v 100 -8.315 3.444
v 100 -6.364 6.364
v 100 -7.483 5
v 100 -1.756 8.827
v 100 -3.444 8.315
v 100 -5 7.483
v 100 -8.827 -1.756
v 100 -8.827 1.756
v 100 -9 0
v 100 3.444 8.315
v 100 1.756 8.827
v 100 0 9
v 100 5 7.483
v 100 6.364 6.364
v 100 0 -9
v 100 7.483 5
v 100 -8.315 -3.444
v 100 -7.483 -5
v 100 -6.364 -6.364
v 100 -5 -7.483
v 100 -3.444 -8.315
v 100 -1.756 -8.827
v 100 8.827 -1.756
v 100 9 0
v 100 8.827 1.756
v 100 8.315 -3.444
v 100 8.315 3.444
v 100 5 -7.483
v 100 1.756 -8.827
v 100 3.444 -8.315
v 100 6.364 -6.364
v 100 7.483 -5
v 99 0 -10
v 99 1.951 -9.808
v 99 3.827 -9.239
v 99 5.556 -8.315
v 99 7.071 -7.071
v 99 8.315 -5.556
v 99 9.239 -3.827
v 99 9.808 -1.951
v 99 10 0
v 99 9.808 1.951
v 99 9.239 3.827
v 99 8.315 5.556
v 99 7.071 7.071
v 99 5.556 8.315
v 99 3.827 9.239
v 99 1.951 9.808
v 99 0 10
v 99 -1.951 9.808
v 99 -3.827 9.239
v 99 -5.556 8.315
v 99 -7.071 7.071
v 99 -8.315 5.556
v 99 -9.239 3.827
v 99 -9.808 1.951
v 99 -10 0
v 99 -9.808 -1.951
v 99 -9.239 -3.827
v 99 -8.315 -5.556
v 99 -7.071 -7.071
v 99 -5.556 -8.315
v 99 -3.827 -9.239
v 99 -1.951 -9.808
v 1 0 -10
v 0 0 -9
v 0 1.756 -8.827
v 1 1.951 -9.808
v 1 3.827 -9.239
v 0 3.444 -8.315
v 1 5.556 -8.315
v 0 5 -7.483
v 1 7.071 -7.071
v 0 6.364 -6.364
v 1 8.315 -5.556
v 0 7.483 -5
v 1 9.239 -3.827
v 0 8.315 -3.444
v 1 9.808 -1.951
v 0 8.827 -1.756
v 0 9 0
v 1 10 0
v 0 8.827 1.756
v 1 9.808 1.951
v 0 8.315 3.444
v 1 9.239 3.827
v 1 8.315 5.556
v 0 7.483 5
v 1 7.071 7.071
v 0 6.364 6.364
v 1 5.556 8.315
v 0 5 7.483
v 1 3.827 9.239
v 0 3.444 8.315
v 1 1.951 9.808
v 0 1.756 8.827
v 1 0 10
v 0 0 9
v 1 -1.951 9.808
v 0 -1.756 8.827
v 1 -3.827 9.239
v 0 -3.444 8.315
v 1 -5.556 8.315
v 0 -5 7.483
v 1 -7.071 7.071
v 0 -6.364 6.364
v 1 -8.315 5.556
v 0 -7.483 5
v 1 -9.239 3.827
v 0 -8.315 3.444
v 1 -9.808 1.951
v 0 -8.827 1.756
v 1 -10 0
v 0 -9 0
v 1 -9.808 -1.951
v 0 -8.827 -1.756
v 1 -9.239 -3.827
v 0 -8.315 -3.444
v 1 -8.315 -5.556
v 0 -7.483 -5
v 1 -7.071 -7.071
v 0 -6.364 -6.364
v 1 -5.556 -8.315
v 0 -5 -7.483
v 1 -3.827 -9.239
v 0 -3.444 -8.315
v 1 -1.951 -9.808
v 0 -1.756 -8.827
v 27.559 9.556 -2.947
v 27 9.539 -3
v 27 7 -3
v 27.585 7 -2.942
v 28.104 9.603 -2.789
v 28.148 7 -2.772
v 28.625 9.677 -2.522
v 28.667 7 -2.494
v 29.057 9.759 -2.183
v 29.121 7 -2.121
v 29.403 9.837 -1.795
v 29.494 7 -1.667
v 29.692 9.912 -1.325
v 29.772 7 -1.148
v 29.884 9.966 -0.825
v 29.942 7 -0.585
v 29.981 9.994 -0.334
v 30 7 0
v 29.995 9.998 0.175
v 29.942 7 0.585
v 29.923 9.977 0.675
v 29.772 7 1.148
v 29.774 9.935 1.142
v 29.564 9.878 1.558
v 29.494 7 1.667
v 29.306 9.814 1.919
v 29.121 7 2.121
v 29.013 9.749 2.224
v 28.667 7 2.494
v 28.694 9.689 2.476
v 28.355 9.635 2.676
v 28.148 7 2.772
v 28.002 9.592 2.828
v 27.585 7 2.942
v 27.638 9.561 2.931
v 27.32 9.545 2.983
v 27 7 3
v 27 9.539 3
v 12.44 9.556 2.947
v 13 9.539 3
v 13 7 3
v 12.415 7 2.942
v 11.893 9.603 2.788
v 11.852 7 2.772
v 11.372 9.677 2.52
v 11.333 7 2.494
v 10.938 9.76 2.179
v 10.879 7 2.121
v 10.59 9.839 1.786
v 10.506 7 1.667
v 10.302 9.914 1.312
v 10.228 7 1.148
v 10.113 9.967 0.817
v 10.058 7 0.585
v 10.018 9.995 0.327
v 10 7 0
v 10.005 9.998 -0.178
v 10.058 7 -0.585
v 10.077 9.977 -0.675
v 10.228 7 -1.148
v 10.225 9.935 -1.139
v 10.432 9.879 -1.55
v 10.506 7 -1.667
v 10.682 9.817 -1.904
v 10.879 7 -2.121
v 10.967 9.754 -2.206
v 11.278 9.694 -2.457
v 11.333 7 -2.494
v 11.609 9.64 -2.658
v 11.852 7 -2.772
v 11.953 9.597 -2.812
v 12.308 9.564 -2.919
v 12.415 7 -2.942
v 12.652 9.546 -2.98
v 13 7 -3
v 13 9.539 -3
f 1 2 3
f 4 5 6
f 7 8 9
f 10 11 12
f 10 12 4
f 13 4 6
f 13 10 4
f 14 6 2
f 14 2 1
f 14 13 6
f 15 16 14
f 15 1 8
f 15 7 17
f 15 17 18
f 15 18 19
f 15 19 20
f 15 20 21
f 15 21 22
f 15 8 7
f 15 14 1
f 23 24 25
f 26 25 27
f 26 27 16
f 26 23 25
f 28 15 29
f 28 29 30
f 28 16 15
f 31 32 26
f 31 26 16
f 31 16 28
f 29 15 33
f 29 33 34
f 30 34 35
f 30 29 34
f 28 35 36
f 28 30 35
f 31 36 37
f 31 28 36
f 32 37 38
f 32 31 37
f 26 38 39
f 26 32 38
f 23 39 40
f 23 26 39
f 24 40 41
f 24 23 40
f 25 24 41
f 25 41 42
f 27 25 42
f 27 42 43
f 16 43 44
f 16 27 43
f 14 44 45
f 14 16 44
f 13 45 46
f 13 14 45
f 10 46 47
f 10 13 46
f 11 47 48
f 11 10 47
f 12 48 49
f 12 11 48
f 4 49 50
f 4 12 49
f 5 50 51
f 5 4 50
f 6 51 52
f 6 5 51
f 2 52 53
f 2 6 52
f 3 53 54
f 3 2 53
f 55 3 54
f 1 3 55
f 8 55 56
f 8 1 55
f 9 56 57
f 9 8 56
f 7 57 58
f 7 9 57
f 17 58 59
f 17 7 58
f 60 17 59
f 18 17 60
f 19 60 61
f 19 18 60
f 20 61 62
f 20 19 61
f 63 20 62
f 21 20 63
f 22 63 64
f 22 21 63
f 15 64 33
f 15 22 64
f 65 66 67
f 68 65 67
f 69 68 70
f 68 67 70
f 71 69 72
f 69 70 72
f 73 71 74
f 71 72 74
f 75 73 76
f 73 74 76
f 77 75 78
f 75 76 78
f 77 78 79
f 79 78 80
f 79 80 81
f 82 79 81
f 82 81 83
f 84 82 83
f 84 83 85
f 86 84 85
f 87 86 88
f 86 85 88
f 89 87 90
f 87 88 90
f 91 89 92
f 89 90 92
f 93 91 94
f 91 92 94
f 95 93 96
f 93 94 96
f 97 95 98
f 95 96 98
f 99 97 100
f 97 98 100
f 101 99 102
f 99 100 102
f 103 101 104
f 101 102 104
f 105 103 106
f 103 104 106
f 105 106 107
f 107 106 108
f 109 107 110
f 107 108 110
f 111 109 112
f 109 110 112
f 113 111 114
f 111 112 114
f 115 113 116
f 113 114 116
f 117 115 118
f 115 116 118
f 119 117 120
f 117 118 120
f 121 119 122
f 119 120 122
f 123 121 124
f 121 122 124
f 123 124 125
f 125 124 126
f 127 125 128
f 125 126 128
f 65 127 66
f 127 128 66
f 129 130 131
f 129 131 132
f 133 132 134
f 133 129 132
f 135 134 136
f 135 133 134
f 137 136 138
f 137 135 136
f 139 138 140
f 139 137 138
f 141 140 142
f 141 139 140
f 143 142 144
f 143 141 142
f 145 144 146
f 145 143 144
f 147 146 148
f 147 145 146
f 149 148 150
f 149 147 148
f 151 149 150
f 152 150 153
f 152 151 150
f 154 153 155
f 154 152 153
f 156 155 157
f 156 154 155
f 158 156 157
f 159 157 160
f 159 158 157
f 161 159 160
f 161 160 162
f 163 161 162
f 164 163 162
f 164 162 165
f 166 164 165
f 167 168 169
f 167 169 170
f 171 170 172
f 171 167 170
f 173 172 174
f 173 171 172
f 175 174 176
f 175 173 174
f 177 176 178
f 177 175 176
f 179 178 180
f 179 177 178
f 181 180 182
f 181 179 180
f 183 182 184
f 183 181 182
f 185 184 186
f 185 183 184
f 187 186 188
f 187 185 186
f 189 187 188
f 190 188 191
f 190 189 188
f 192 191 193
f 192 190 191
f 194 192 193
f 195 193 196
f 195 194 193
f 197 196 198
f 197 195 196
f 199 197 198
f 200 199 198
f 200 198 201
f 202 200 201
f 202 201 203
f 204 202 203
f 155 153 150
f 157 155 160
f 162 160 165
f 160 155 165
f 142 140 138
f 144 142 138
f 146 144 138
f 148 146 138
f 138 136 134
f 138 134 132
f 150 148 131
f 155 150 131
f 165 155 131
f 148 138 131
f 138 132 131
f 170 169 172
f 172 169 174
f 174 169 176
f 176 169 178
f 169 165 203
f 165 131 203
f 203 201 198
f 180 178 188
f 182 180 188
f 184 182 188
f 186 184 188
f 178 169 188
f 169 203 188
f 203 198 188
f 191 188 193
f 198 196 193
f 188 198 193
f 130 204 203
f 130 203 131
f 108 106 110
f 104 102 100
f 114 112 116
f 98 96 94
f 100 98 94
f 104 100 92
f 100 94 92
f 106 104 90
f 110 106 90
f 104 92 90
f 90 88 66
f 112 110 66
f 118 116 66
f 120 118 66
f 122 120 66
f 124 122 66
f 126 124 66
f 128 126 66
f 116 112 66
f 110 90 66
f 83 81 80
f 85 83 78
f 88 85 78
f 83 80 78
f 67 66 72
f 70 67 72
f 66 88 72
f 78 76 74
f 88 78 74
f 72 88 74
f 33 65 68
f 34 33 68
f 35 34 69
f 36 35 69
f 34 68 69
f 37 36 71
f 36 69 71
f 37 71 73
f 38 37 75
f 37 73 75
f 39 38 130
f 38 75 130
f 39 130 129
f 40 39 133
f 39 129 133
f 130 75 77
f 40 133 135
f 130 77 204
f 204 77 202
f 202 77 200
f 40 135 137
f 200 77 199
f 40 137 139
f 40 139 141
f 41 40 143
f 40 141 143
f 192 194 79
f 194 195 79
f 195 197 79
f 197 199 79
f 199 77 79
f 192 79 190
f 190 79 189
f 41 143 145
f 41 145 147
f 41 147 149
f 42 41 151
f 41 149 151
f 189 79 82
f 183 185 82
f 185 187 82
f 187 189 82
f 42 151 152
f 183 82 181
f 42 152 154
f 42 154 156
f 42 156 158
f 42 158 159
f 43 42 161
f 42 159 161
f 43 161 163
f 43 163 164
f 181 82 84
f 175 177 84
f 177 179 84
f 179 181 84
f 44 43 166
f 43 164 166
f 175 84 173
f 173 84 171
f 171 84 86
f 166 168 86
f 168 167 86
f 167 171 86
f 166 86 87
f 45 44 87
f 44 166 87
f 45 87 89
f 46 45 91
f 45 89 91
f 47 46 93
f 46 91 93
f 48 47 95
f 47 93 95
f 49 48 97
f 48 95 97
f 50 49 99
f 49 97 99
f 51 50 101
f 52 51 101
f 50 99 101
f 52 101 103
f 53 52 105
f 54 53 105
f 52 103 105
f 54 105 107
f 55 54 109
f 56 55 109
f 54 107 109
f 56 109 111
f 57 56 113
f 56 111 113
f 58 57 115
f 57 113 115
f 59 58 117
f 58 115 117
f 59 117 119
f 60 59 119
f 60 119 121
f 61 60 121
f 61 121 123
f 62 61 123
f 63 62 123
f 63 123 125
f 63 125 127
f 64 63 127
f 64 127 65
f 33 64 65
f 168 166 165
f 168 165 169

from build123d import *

# Parameters (mm, degrees)
SKETCH_1_R          = 10
EXTRUDE_1_DEPTH     = 100
CUT_EXTRUDE_1_DEPTH = 3
CHAMFER_1_SIZE      = 1
CHAMFER_2_SIZE      = 1


with BuildPart() as part:
    # 草图1 → 凸台-拉伸1 (new body)
    with BuildSketch(Plane(origin=(0, 0, 0), x_dir=(0, 0, -1), z_dir=(1, 0, 0))):
        Circle(SKETCH_1_R)
    extrude(amount=EXTRUDE_1_DEPTH)

    # 草图2 → 切除-拉伸1 (cut)
    with BuildSketch(Plane(origin=(0, 10, 0), x_dir=(1, 0, 0), z_dir=(0, 1, 0))):
        with BuildLine():
            Line((13, 3), (27, 3))
            ThreePointArc((27, 3), (30, 0), (27, -3))
            Line((27, -3), (13, -3))
            ThreePointArc((13, -3), (10, 0), (13, 3))
        make_face()
    extrude(amount=-CUT_EXTRUDE_1_DEPTH, mode=Mode.SUBTRACT)

    # 倒角1
    chamfer_1_edges = [part.edges().sort_by_distance(p)[0] for p in [
        (0, 0, 10),
    ]]
    chamfer(chamfer_1_edges, length=CHAMFER_1_SIZE)

    # 倒角2
    chamfer_2_edges = [part.edges().sort_by_distance(p)[0] for p in [
        (100, 0, 10),
    ]]
    chamfer(chamfer_2_edges, length=CHAMFER_2_SIZE)


solid = part.part
